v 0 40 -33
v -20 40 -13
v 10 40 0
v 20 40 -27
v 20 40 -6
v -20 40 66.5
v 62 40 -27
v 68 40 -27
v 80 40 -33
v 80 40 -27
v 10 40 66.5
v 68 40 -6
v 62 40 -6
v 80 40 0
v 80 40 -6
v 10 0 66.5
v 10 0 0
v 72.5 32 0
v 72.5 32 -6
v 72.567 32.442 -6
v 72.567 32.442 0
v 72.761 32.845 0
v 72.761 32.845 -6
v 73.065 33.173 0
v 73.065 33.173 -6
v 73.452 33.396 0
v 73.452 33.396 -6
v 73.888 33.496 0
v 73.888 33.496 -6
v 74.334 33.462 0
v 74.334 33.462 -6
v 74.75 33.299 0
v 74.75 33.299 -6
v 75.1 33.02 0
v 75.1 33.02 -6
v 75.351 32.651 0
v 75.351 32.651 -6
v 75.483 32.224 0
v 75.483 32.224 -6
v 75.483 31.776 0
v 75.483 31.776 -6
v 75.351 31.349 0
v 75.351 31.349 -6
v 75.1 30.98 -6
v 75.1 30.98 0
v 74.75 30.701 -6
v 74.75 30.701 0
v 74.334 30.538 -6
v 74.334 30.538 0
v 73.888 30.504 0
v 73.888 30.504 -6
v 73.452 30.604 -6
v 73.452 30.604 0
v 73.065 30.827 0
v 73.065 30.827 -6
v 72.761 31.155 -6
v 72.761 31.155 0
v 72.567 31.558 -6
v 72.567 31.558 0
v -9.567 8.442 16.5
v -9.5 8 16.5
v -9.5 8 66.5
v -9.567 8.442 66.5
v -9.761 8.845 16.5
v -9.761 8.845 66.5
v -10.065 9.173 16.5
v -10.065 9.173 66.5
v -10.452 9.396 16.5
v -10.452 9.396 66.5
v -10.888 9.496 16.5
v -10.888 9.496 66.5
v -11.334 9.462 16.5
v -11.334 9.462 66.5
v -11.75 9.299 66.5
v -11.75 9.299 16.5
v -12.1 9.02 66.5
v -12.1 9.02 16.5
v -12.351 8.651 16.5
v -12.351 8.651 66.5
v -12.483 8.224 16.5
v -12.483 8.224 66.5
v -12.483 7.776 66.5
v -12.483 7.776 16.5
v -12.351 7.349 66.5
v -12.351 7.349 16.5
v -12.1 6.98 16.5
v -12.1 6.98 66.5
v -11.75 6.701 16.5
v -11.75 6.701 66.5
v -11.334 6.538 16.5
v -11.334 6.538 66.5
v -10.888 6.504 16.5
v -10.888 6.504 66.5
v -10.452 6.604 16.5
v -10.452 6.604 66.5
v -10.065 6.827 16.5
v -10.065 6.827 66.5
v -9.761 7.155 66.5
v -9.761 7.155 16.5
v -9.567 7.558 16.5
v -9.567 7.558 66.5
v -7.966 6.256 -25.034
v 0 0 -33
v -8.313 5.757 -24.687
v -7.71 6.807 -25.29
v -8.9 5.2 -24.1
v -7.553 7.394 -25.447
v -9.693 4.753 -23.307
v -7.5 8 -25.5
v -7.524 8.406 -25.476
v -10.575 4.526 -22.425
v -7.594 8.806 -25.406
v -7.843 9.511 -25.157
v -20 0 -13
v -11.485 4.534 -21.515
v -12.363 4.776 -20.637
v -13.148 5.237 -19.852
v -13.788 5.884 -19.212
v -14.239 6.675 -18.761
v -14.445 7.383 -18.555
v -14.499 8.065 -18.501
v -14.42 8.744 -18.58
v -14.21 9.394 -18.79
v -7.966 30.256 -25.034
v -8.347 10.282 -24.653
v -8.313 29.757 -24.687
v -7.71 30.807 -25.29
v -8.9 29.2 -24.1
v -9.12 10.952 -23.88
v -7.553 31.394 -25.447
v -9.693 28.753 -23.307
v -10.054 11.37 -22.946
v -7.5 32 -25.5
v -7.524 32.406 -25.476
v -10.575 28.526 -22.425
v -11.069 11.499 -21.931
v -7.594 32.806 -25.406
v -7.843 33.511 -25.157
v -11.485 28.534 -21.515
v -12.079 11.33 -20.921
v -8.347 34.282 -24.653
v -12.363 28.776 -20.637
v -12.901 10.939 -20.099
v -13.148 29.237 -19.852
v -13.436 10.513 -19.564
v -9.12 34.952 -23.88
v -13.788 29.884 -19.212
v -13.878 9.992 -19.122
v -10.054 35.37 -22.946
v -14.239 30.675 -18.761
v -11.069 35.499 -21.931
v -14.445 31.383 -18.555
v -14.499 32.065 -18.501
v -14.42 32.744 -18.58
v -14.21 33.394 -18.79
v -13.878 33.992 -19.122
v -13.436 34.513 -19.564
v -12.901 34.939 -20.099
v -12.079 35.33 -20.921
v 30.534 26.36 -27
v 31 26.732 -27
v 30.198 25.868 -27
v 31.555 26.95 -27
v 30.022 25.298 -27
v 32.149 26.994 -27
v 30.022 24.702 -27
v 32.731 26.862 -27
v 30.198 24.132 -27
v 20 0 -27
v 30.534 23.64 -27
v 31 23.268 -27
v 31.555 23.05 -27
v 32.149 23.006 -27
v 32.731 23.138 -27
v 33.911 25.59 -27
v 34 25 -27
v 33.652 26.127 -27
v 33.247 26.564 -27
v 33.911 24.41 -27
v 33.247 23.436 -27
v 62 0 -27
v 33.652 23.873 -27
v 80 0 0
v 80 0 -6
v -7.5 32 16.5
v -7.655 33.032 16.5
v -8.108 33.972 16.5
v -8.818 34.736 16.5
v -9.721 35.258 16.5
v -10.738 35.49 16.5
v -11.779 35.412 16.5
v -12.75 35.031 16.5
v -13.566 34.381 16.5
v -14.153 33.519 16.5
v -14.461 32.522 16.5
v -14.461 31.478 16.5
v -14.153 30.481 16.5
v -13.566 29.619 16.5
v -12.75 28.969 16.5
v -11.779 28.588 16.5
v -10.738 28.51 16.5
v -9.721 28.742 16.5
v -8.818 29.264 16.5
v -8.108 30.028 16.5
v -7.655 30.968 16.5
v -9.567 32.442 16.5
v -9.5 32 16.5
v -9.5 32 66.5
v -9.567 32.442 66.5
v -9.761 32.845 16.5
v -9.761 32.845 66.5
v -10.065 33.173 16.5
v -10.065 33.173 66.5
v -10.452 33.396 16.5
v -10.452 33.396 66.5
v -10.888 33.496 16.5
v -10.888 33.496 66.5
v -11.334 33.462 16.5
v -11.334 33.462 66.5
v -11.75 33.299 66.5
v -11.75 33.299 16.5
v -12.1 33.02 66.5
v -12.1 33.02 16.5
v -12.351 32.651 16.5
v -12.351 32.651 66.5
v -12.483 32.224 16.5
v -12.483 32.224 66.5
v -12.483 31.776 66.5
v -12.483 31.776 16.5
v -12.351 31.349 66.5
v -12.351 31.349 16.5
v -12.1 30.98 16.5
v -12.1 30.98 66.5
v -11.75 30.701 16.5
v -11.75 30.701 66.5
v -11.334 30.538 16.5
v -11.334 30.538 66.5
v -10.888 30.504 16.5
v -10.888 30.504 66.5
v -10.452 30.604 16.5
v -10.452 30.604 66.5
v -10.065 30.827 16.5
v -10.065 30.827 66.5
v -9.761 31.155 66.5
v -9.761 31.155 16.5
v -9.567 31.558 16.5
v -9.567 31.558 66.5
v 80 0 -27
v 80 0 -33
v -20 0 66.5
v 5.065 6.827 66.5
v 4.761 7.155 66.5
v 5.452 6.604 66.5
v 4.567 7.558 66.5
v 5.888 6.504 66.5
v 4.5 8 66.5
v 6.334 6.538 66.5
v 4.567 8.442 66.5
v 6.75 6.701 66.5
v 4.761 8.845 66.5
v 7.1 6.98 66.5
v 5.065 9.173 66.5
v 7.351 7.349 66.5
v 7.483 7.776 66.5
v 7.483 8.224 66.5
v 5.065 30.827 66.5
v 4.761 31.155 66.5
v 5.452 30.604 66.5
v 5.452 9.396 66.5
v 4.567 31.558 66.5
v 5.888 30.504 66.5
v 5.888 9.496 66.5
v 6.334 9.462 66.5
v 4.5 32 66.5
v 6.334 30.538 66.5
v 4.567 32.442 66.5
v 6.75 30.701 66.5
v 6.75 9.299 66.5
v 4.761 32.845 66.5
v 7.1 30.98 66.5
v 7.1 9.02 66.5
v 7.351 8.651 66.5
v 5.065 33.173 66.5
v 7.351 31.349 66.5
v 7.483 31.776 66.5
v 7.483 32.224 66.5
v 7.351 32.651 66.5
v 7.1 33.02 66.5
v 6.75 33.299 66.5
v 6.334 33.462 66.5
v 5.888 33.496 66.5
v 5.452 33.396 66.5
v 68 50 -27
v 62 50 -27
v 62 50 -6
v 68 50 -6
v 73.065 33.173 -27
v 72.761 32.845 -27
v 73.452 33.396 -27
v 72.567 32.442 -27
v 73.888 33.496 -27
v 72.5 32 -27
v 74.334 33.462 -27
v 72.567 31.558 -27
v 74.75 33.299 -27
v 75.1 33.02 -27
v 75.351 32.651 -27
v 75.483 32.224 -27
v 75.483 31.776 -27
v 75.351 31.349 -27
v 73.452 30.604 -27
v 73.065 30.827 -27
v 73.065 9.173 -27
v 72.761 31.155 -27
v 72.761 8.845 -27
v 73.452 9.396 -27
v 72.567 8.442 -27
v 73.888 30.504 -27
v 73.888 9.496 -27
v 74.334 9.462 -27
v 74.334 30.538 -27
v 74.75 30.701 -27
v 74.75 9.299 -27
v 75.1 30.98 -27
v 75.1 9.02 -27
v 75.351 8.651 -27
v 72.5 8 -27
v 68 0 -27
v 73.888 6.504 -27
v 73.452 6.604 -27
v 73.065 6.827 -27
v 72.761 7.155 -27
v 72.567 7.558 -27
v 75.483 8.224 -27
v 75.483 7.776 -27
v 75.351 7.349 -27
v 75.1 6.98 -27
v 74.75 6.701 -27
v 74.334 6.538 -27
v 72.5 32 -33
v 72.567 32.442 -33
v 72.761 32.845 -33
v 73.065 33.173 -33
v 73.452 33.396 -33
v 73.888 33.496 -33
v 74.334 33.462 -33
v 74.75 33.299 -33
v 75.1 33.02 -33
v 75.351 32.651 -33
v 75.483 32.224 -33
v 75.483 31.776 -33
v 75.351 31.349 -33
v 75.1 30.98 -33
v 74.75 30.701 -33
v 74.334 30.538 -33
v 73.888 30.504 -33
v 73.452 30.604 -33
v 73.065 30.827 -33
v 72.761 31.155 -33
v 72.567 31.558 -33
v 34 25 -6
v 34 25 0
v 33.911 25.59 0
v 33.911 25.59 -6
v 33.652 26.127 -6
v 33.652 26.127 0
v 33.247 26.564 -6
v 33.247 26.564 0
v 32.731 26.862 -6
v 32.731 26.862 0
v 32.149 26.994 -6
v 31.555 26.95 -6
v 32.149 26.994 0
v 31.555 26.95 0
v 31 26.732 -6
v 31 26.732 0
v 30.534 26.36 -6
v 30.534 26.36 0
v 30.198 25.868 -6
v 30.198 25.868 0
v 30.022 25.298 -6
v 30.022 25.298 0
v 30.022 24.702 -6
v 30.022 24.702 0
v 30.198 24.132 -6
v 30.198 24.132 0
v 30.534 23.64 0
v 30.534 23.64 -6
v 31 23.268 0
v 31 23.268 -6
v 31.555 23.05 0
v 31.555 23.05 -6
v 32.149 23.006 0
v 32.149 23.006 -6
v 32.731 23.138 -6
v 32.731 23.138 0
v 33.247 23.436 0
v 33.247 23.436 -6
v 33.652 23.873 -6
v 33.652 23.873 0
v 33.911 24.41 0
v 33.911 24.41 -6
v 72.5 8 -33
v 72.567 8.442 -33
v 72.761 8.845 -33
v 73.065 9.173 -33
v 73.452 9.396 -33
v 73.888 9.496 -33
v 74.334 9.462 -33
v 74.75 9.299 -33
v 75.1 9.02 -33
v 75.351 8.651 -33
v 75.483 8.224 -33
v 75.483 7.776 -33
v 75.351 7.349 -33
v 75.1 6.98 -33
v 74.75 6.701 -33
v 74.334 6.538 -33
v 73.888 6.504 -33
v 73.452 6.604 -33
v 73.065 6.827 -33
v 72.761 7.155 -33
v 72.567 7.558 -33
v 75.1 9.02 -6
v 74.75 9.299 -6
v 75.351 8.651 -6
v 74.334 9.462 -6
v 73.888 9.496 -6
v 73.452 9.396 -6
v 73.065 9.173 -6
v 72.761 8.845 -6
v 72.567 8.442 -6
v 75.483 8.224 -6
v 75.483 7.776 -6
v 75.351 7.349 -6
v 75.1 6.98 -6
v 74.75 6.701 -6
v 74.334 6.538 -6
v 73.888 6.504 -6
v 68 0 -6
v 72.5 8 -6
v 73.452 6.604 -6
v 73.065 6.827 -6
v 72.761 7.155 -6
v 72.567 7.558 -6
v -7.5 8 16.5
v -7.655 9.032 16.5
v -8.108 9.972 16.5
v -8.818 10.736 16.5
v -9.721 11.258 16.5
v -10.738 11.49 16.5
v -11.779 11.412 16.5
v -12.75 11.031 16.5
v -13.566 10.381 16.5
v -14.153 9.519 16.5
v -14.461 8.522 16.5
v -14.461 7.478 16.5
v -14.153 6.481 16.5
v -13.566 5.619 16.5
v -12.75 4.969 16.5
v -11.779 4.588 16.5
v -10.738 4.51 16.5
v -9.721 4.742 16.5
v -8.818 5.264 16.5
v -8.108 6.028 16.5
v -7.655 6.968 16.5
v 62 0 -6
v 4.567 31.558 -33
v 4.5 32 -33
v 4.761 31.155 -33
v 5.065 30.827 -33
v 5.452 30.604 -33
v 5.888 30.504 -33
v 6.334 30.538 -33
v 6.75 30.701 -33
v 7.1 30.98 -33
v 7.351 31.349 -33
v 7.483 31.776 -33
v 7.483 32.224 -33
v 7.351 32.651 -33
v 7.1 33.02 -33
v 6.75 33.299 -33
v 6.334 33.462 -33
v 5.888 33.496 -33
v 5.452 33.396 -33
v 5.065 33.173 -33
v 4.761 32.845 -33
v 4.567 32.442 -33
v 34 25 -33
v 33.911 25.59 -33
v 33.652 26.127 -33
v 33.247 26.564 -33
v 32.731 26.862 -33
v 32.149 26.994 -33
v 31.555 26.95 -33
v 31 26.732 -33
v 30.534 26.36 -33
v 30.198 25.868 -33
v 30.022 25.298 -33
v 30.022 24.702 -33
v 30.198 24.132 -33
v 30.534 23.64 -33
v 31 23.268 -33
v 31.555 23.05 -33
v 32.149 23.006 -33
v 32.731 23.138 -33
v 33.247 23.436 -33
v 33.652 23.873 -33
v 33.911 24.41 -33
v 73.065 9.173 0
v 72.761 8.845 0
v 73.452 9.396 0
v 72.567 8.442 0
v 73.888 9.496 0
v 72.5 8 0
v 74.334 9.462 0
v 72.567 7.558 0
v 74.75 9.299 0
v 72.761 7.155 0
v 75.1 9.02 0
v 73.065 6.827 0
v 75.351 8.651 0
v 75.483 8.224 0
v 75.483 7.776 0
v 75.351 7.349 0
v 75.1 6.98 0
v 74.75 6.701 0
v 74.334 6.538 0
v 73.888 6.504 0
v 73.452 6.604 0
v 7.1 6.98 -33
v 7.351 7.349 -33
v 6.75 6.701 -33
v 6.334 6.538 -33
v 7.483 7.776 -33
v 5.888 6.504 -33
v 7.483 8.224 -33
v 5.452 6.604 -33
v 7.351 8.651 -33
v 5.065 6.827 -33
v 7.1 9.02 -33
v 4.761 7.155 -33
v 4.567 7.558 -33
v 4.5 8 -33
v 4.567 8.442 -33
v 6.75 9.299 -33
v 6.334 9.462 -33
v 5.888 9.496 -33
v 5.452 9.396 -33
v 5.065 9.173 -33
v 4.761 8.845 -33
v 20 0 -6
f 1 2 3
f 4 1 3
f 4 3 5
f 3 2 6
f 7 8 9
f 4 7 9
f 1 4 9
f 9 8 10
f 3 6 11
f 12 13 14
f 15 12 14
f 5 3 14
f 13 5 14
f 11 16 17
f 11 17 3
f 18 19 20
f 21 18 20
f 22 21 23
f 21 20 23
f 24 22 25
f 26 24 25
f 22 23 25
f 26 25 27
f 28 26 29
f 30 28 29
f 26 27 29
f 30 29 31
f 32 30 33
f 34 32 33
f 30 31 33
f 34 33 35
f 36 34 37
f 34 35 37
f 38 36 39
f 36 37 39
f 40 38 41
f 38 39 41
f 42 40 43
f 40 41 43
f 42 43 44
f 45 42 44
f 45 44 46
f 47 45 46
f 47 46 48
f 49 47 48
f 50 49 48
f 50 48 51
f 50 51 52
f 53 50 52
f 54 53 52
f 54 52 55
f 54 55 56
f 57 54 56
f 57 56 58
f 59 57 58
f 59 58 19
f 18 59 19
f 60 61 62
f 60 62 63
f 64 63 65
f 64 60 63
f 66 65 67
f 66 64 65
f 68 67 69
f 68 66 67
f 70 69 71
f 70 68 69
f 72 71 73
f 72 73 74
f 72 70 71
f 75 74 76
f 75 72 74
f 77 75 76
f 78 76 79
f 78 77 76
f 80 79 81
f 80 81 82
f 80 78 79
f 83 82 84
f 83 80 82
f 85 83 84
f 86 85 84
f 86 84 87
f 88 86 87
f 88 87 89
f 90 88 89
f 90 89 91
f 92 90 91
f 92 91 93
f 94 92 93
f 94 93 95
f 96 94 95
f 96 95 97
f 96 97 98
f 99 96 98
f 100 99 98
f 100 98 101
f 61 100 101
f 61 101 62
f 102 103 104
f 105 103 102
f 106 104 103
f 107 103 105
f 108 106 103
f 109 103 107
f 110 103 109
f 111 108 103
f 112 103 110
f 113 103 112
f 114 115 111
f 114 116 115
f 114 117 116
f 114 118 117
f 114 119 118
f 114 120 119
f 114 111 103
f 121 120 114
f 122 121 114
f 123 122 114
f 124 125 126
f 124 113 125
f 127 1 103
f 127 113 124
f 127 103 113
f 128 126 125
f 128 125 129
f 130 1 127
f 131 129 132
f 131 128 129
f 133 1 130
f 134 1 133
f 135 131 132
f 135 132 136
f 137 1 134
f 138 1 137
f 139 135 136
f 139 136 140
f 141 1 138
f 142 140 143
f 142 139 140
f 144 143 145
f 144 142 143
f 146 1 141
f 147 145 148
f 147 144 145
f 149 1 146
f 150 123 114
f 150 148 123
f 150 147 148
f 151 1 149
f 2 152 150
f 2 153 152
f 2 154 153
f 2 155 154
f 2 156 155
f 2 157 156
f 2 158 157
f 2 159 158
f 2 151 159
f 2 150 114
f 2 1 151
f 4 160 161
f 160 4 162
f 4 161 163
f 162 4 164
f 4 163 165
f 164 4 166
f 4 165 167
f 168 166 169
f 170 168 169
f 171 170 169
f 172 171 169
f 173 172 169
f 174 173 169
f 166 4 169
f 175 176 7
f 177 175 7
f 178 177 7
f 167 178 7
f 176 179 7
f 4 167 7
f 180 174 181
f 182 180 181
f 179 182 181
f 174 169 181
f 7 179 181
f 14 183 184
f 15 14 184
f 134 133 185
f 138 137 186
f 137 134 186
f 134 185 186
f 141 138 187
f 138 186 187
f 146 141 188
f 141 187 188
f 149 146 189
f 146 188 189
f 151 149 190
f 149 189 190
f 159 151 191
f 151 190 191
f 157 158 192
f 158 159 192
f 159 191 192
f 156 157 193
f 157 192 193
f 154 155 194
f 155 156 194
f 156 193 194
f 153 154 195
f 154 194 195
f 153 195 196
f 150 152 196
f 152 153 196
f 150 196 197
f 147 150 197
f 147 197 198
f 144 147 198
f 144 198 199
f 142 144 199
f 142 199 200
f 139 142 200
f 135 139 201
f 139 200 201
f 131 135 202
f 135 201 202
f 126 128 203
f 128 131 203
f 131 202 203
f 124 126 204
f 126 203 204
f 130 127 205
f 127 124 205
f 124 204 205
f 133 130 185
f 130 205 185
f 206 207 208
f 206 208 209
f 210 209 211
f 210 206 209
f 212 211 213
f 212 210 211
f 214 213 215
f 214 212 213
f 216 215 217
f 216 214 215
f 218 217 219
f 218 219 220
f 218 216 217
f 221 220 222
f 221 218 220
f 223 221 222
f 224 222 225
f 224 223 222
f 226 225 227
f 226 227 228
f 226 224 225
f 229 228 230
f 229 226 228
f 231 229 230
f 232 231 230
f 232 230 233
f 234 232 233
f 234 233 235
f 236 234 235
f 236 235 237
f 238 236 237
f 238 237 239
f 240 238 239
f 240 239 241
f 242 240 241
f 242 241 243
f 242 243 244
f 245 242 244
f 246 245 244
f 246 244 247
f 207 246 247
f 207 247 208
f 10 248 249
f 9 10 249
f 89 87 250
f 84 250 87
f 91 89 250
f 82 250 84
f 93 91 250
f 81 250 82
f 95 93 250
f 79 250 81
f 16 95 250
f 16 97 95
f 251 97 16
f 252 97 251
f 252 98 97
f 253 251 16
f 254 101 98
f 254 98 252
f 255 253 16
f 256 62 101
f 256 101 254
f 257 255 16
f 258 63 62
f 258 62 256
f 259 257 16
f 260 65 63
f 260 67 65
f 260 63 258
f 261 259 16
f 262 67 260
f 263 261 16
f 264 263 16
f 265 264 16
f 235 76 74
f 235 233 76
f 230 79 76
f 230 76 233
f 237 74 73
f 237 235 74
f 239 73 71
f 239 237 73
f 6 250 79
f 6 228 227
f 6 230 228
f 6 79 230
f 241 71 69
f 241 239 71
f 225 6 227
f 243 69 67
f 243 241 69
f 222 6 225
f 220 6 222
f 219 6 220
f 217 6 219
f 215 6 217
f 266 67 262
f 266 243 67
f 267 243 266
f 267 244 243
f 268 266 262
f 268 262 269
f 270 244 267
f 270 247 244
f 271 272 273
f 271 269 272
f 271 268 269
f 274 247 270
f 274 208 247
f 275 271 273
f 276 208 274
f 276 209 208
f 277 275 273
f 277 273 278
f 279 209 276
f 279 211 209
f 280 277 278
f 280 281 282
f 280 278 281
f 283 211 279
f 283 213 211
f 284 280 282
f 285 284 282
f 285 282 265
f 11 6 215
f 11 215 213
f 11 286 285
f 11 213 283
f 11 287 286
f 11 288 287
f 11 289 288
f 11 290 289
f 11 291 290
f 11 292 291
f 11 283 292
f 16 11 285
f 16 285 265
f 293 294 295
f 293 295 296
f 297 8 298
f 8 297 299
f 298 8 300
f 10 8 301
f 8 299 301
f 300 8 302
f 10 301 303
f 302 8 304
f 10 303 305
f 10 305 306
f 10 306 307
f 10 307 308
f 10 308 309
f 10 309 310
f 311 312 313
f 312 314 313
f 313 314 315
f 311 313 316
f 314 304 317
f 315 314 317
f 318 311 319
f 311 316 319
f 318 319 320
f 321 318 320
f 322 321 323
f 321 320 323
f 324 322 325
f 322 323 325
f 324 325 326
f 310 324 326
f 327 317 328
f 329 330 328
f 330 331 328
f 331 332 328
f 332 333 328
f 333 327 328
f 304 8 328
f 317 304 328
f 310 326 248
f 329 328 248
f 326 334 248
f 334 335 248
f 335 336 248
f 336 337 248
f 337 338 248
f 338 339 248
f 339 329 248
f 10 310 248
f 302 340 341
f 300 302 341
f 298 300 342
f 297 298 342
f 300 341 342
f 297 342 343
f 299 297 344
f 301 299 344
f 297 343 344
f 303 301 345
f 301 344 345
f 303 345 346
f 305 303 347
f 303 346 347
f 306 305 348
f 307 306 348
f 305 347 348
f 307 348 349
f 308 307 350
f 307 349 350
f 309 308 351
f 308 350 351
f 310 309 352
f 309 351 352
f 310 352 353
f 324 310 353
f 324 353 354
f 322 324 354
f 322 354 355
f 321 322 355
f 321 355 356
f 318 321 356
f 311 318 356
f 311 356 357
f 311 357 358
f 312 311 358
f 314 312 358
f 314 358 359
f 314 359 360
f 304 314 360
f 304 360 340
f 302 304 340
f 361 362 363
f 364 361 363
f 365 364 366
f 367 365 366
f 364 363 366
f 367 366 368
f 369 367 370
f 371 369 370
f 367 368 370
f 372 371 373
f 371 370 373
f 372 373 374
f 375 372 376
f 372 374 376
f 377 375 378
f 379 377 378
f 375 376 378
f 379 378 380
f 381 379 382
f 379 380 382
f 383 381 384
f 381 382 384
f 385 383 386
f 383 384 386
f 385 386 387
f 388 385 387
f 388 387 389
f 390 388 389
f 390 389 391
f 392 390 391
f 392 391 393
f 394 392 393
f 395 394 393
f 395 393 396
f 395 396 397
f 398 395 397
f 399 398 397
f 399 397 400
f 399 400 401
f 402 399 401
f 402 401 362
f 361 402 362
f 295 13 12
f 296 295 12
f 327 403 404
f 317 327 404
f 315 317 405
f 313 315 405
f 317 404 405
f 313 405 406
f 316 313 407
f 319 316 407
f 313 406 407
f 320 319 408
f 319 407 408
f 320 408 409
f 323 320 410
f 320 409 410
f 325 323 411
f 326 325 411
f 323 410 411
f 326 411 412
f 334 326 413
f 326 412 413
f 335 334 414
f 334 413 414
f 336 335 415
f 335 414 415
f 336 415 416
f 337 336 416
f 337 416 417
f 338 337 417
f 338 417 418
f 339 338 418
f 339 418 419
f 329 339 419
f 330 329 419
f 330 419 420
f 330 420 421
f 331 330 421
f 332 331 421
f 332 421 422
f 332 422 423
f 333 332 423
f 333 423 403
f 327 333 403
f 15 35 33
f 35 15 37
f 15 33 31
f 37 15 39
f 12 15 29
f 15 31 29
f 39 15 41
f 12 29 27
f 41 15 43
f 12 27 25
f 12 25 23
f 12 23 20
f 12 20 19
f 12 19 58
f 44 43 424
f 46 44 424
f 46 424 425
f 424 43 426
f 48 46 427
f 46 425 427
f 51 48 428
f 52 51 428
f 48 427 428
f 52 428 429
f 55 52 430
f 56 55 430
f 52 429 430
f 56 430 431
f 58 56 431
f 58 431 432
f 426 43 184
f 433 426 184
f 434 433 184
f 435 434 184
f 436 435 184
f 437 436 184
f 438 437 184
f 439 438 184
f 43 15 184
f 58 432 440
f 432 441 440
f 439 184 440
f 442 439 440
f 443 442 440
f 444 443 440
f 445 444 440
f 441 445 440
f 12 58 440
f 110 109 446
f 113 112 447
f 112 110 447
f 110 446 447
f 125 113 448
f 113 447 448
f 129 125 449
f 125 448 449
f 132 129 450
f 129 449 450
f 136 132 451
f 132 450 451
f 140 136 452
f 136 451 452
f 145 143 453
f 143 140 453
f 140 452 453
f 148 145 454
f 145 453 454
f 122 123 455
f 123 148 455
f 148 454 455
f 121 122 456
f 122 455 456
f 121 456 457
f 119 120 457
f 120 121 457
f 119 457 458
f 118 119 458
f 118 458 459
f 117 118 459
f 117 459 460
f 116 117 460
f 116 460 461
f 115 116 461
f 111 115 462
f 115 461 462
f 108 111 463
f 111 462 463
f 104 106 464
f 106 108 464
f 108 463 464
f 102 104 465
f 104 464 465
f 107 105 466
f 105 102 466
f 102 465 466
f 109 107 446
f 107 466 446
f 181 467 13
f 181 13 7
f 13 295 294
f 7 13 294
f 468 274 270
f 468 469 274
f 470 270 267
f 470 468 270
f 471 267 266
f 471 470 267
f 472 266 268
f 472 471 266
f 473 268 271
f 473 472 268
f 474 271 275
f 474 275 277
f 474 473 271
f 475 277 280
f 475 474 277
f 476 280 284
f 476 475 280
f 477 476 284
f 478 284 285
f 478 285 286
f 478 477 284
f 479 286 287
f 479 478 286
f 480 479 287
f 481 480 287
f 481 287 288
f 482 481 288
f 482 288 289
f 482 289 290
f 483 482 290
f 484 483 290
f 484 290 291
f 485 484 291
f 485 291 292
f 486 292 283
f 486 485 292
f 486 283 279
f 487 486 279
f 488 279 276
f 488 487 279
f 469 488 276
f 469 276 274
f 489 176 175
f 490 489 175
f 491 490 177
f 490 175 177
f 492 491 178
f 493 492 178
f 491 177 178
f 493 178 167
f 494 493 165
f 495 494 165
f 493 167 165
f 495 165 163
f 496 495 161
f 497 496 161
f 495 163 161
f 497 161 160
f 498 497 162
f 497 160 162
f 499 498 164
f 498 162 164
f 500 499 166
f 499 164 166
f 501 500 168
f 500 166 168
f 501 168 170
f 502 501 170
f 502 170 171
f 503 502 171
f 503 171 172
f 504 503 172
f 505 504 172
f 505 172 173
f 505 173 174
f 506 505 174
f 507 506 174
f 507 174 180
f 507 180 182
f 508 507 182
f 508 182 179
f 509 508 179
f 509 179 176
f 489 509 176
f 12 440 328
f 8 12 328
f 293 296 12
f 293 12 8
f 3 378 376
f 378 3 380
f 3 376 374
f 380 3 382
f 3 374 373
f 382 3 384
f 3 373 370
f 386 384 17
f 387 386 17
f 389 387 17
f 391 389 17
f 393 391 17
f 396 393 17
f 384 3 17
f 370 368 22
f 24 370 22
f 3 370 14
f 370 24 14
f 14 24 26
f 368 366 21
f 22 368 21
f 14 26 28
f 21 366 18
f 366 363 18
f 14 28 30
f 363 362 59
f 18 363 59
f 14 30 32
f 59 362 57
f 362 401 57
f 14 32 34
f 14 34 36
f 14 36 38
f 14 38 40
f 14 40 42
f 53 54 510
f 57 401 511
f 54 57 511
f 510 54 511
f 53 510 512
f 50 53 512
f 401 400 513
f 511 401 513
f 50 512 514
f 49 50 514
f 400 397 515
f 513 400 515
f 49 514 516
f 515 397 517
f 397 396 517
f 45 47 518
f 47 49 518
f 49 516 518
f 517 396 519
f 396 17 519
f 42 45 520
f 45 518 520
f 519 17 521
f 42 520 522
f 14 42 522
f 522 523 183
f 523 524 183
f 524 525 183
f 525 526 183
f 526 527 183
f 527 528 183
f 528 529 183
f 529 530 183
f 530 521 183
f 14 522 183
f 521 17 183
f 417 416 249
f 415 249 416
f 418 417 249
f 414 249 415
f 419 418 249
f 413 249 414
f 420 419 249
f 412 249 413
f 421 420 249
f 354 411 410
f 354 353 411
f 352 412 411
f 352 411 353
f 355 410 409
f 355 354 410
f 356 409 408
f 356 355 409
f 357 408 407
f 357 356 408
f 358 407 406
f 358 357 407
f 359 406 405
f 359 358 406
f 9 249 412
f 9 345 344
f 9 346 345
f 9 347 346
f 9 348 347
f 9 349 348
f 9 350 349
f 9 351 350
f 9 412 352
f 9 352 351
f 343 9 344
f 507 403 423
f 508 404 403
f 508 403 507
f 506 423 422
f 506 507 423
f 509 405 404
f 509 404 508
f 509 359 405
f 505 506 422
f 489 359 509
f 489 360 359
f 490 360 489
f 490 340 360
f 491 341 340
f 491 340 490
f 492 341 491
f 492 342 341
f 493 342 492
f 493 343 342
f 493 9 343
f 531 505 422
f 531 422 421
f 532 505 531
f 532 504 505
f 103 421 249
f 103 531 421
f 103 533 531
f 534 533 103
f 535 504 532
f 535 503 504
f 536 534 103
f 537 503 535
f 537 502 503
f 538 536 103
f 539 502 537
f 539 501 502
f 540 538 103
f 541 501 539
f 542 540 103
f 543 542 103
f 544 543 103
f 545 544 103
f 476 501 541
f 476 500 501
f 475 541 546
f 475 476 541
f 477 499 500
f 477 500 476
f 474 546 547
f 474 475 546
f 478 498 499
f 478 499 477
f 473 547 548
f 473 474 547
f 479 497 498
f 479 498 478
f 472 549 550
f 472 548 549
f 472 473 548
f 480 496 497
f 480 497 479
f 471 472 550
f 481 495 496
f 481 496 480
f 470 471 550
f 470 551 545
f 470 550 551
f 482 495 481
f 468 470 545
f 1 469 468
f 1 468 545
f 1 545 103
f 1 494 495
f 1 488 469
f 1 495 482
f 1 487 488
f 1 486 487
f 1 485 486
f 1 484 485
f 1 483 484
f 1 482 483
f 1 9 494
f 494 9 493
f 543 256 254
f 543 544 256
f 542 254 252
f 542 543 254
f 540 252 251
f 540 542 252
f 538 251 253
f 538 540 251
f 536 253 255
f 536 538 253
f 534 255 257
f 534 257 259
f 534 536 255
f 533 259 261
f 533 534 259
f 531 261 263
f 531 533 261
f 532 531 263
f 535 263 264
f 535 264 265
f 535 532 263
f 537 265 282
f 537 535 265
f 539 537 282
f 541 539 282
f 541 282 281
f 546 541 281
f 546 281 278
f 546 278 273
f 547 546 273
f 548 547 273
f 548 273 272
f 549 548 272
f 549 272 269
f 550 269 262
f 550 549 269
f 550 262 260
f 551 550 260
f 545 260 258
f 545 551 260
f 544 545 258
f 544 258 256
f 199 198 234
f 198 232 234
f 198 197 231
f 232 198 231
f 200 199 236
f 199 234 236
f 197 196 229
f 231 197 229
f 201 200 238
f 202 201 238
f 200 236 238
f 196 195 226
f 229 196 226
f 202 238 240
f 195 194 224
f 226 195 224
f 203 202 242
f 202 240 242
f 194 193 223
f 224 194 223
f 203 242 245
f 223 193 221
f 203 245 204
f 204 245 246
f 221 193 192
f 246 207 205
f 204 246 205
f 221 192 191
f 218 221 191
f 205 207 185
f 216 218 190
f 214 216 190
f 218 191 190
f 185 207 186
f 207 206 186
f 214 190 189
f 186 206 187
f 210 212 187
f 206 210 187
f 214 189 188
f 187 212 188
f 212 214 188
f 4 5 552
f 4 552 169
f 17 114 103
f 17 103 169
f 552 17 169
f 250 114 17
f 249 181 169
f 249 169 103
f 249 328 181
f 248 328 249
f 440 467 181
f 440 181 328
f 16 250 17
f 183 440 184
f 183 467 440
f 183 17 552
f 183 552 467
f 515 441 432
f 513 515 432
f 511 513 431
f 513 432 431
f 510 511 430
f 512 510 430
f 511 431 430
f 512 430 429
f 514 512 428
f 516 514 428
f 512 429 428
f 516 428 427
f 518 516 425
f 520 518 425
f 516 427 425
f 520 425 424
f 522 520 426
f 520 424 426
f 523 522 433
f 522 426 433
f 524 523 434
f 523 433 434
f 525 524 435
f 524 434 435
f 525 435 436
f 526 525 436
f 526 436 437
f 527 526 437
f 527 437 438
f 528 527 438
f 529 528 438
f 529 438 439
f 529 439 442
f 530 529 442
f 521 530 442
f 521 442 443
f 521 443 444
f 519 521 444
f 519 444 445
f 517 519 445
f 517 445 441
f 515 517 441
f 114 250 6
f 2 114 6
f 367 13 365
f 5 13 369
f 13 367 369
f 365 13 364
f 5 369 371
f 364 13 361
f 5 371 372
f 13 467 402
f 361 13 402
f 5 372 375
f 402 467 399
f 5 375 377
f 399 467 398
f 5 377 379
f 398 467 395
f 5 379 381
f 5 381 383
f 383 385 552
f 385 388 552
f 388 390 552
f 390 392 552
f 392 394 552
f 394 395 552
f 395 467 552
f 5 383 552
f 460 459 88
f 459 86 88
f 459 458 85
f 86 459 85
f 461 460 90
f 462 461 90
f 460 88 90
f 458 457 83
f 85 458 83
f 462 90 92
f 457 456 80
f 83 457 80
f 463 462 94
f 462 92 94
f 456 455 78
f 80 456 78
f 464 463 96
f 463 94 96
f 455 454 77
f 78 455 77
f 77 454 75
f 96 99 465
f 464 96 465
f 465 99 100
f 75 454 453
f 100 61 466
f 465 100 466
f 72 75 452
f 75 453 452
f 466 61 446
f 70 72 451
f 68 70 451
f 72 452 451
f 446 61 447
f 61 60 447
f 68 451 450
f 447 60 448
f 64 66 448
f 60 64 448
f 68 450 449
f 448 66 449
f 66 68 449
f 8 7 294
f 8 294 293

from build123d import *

# Parameters (mm, degrees)
EXTRUDE_1_DEPTH             = 40
SKETCH_8_R                  = 1.5
CUT_EXTRUDE_2_DEPTH         = 96.336247042
SKETCH_12_W                 = 30
SKETCH_12_H                 = 40
SKETCH_12_R                 = 1.5
EXTRUDE_7_DEPTH             = 66.5
EXTRUDE_7_DIRECTION_2_REACH = 97.336
CUT_EXTRUDE_3_DEPTH         = 112.45514793
CUT_EXTRUDE_START           = -50
SKETCH_15_R                 = 3.5
CUT_EXTRUDE_4_DEPTH         = 84.791815893
SKETCH_16_W                 = 6
SKETCH_16_H                 = 21
EXTRUDE_9_DEPTH             = 10
EXTRUDE_9_DIRECTION_2_REACH = 113.455
SKETCH_17_R                 = 2
CUT_EXTRUDE_5_DEPTH         = 116.422051619


with BuildPart() as part:
    # 草图1 → 凸台-拉伸1 (new body)
    with BuildSketch(Plane(origin=(0, 0, 0), x_dir=(1, 0, 0), z_dir=(0, 1, 0))):
        Polygon((0, 0), (80, 0), (80, 6), (20, 6), (20, 27), (80, 27), (80, 33), (0, 33), align=None)
    extrude(amount=EXTRUDE_1_DEPTH)

    # 草图8 → 切除-拉伸2 (cut, through all)
    with BuildSketch(Plane(origin=(0, 0, -33), x_dir=(-1, 0, 0), z_dir=(0, 0, -1))):
        with Locations((-74, 8)):
            Circle(SKETCH_8_R)
        with Locations((-74, 32)):
            Circle(SKETCH_8_R)
        with Locations((-6, 32)):
            Circle(SKETCH_8_R)
        with Locations((-6, 8)):
            Circle(SKETCH_8_R)
    extrude(amount=-CUT_EXTRUDE_2_DEPTH, mode=Mode.SUBTRACT)

    # 草图12 → 凸台-拉伸7 (add)
    with BuildSketch(Plane.XY):
        with Locations((-5, 20)):
            Rectangle(SKETCH_12_W, SKETCH_12_H)
        with Locations((-11, 32)):
            Circle(SKETCH_12_R, mode=Mode.SUBTRACT)
        with Locations((-11, 8)):
            Circle(SKETCH_12_R, mode=Mode.SUBTRACT)
        with Locations(Location((6, 8, 0), (0, 0, 180))):
            Circle(SKETCH_12_R, mode=Mode.SUBTRACT)
        with Locations(Location((6, 32, 0), (0, 0, 180))):
            Circle(SKETCH_12_R, mode=Mode.SUBTRACT)
    extrude(amount=EXTRUDE_7_DEPTH)

    # 凸台-拉伸7 direction 2: up to this face of the body (flat: up to its plane)
    extrude_7_direction_2_end = Plane(part.part.faces().sort_by_distance((40, 20, -33))[0])
    # 草图12 → 凸台-拉伸7 direction 2 (add, up to the picked face)
    with BuildSketch(Plane.XY, mode=Mode.PRIVATE) as extrude_7_direction_2_sk1:
        with Locations((-5, 20)):
            Rectangle(SKETCH_12_W, SKETCH_12_H)
        with Locations((-11, 32)):
            Circle(SKETCH_12_R, mode=Mode.SUBTRACT)
        with Locations((-11, 8)):
            Circle(SKETCH_12_R, mode=Mode.SUBTRACT)
        with Locations(Location((6, 8, 0), (0, 0, 180))):
            Circle(SKETCH_12_R, mode=Mode.SUBTRACT)
        with Locations(Location((6, 32, 0), (0, 0, 180))):
            Circle(SKETCH_12_R, mode=Mode.SUBTRACT)
    extrude_7_direction_2_tool1 = split(extrude(extrude_7_direction_2_sk1.sketch, amount=-EXTRUDE_7_DIRECTION_2_REACH, mode=Mode.PRIVATE), bisect_by=extrude_7_direction_2_end, keep=Keep.BOTH, mode=Mode.PRIVATE)
    add(extrude_7_direction_2_tool1.solids().sort_by(Axis((-5.060326, 20, 0), (0, 0, -1)))[0])

    # 草图14 → 切除-拉伸3 (cut, through all)
    with BuildSketch(Plane(origin=(0, 40, 0), x_dir=(1, 0, 0), z_dir=(0, 1, 0))):
        Polygon((-20, 33), (0, 33), (-20, 13), align=None)
    extrude(amount=-CUT_EXTRUDE_3_DEPTH, mode=Mode.SUBTRACT)

    # 草图15 → 切除-拉伸4 (cut, through all)
    with BuildSketch(Plane.XY.offset(66.5).offset(CUT_EXTRUDE_START)):
        with Locations((-11, 32)):
            Circle(SKETCH_15_R)
        with Locations((-11, 8)):
            Circle(SKETCH_15_R)
    extrude(amount=-CUT_EXTRUDE_4_DEPTH, mode=Mode.SUBTRACT)

    # 草图16 → 凸台-拉伸9 (add)
    with BuildSketch(Plane(origin=(0, 40, 0), x_dir=(1, 0, 0), z_dir=(0, 1, 0))):
        with Locations((65, 16.5)):
            Rectangle(SKETCH_16_W, SKETCH_16_H)
    extrude(amount=EXTRUDE_9_DEPTH)

    # 凸台-拉伸9 direction 2: up to this face of the body (flat: up to its plane)
    extrude_9_direction_2_end = Plane(part.part.faces().sort_by_distance((7.48152977, 0, 9.893198609))[0])
    # 草图16 → 凸台-拉伸9 direction 2 (add, up to the picked face)
    with BuildSketch(Plane(origin=(0, 40, 0), x_dir=(1, 0, 0), z_dir=(0, 1, 0)), mode=Mode.PRIVATE) as extrude_9_direction_2_sk1:
        with Locations((65, 16.5)):
            Rectangle(SKETCH_16_W, SKETCH_16_H)
    extrude_9_direction_2_tool1 = split(extrude(extrude_9_direction_2_sk1.sketch, amount=-EXTRUDE_9_DIRECTION_2_REACH, mode=Mode.PRIVATE), bisect_by=extrude_9_direction_2_end, keep=Keep.BOTH, mode=Mode.PRIVATE)
    add(extrude_9_direction_2_tool1.solids().sort_by(Axis((65, 40, -16.5), (0, -1, 0)))[0])

    # 草图17 → 切除-拉伸5 (cut, through all)
    with BuildSketch(Plane.XY):
        with Locations((32, 25)):
            Circle(SKETCH_17_R)
    extrude(amount=-CUT_EXTRUDE_5_DEPTH, mode=Mode.SUBTRACT)


solid = part.part
